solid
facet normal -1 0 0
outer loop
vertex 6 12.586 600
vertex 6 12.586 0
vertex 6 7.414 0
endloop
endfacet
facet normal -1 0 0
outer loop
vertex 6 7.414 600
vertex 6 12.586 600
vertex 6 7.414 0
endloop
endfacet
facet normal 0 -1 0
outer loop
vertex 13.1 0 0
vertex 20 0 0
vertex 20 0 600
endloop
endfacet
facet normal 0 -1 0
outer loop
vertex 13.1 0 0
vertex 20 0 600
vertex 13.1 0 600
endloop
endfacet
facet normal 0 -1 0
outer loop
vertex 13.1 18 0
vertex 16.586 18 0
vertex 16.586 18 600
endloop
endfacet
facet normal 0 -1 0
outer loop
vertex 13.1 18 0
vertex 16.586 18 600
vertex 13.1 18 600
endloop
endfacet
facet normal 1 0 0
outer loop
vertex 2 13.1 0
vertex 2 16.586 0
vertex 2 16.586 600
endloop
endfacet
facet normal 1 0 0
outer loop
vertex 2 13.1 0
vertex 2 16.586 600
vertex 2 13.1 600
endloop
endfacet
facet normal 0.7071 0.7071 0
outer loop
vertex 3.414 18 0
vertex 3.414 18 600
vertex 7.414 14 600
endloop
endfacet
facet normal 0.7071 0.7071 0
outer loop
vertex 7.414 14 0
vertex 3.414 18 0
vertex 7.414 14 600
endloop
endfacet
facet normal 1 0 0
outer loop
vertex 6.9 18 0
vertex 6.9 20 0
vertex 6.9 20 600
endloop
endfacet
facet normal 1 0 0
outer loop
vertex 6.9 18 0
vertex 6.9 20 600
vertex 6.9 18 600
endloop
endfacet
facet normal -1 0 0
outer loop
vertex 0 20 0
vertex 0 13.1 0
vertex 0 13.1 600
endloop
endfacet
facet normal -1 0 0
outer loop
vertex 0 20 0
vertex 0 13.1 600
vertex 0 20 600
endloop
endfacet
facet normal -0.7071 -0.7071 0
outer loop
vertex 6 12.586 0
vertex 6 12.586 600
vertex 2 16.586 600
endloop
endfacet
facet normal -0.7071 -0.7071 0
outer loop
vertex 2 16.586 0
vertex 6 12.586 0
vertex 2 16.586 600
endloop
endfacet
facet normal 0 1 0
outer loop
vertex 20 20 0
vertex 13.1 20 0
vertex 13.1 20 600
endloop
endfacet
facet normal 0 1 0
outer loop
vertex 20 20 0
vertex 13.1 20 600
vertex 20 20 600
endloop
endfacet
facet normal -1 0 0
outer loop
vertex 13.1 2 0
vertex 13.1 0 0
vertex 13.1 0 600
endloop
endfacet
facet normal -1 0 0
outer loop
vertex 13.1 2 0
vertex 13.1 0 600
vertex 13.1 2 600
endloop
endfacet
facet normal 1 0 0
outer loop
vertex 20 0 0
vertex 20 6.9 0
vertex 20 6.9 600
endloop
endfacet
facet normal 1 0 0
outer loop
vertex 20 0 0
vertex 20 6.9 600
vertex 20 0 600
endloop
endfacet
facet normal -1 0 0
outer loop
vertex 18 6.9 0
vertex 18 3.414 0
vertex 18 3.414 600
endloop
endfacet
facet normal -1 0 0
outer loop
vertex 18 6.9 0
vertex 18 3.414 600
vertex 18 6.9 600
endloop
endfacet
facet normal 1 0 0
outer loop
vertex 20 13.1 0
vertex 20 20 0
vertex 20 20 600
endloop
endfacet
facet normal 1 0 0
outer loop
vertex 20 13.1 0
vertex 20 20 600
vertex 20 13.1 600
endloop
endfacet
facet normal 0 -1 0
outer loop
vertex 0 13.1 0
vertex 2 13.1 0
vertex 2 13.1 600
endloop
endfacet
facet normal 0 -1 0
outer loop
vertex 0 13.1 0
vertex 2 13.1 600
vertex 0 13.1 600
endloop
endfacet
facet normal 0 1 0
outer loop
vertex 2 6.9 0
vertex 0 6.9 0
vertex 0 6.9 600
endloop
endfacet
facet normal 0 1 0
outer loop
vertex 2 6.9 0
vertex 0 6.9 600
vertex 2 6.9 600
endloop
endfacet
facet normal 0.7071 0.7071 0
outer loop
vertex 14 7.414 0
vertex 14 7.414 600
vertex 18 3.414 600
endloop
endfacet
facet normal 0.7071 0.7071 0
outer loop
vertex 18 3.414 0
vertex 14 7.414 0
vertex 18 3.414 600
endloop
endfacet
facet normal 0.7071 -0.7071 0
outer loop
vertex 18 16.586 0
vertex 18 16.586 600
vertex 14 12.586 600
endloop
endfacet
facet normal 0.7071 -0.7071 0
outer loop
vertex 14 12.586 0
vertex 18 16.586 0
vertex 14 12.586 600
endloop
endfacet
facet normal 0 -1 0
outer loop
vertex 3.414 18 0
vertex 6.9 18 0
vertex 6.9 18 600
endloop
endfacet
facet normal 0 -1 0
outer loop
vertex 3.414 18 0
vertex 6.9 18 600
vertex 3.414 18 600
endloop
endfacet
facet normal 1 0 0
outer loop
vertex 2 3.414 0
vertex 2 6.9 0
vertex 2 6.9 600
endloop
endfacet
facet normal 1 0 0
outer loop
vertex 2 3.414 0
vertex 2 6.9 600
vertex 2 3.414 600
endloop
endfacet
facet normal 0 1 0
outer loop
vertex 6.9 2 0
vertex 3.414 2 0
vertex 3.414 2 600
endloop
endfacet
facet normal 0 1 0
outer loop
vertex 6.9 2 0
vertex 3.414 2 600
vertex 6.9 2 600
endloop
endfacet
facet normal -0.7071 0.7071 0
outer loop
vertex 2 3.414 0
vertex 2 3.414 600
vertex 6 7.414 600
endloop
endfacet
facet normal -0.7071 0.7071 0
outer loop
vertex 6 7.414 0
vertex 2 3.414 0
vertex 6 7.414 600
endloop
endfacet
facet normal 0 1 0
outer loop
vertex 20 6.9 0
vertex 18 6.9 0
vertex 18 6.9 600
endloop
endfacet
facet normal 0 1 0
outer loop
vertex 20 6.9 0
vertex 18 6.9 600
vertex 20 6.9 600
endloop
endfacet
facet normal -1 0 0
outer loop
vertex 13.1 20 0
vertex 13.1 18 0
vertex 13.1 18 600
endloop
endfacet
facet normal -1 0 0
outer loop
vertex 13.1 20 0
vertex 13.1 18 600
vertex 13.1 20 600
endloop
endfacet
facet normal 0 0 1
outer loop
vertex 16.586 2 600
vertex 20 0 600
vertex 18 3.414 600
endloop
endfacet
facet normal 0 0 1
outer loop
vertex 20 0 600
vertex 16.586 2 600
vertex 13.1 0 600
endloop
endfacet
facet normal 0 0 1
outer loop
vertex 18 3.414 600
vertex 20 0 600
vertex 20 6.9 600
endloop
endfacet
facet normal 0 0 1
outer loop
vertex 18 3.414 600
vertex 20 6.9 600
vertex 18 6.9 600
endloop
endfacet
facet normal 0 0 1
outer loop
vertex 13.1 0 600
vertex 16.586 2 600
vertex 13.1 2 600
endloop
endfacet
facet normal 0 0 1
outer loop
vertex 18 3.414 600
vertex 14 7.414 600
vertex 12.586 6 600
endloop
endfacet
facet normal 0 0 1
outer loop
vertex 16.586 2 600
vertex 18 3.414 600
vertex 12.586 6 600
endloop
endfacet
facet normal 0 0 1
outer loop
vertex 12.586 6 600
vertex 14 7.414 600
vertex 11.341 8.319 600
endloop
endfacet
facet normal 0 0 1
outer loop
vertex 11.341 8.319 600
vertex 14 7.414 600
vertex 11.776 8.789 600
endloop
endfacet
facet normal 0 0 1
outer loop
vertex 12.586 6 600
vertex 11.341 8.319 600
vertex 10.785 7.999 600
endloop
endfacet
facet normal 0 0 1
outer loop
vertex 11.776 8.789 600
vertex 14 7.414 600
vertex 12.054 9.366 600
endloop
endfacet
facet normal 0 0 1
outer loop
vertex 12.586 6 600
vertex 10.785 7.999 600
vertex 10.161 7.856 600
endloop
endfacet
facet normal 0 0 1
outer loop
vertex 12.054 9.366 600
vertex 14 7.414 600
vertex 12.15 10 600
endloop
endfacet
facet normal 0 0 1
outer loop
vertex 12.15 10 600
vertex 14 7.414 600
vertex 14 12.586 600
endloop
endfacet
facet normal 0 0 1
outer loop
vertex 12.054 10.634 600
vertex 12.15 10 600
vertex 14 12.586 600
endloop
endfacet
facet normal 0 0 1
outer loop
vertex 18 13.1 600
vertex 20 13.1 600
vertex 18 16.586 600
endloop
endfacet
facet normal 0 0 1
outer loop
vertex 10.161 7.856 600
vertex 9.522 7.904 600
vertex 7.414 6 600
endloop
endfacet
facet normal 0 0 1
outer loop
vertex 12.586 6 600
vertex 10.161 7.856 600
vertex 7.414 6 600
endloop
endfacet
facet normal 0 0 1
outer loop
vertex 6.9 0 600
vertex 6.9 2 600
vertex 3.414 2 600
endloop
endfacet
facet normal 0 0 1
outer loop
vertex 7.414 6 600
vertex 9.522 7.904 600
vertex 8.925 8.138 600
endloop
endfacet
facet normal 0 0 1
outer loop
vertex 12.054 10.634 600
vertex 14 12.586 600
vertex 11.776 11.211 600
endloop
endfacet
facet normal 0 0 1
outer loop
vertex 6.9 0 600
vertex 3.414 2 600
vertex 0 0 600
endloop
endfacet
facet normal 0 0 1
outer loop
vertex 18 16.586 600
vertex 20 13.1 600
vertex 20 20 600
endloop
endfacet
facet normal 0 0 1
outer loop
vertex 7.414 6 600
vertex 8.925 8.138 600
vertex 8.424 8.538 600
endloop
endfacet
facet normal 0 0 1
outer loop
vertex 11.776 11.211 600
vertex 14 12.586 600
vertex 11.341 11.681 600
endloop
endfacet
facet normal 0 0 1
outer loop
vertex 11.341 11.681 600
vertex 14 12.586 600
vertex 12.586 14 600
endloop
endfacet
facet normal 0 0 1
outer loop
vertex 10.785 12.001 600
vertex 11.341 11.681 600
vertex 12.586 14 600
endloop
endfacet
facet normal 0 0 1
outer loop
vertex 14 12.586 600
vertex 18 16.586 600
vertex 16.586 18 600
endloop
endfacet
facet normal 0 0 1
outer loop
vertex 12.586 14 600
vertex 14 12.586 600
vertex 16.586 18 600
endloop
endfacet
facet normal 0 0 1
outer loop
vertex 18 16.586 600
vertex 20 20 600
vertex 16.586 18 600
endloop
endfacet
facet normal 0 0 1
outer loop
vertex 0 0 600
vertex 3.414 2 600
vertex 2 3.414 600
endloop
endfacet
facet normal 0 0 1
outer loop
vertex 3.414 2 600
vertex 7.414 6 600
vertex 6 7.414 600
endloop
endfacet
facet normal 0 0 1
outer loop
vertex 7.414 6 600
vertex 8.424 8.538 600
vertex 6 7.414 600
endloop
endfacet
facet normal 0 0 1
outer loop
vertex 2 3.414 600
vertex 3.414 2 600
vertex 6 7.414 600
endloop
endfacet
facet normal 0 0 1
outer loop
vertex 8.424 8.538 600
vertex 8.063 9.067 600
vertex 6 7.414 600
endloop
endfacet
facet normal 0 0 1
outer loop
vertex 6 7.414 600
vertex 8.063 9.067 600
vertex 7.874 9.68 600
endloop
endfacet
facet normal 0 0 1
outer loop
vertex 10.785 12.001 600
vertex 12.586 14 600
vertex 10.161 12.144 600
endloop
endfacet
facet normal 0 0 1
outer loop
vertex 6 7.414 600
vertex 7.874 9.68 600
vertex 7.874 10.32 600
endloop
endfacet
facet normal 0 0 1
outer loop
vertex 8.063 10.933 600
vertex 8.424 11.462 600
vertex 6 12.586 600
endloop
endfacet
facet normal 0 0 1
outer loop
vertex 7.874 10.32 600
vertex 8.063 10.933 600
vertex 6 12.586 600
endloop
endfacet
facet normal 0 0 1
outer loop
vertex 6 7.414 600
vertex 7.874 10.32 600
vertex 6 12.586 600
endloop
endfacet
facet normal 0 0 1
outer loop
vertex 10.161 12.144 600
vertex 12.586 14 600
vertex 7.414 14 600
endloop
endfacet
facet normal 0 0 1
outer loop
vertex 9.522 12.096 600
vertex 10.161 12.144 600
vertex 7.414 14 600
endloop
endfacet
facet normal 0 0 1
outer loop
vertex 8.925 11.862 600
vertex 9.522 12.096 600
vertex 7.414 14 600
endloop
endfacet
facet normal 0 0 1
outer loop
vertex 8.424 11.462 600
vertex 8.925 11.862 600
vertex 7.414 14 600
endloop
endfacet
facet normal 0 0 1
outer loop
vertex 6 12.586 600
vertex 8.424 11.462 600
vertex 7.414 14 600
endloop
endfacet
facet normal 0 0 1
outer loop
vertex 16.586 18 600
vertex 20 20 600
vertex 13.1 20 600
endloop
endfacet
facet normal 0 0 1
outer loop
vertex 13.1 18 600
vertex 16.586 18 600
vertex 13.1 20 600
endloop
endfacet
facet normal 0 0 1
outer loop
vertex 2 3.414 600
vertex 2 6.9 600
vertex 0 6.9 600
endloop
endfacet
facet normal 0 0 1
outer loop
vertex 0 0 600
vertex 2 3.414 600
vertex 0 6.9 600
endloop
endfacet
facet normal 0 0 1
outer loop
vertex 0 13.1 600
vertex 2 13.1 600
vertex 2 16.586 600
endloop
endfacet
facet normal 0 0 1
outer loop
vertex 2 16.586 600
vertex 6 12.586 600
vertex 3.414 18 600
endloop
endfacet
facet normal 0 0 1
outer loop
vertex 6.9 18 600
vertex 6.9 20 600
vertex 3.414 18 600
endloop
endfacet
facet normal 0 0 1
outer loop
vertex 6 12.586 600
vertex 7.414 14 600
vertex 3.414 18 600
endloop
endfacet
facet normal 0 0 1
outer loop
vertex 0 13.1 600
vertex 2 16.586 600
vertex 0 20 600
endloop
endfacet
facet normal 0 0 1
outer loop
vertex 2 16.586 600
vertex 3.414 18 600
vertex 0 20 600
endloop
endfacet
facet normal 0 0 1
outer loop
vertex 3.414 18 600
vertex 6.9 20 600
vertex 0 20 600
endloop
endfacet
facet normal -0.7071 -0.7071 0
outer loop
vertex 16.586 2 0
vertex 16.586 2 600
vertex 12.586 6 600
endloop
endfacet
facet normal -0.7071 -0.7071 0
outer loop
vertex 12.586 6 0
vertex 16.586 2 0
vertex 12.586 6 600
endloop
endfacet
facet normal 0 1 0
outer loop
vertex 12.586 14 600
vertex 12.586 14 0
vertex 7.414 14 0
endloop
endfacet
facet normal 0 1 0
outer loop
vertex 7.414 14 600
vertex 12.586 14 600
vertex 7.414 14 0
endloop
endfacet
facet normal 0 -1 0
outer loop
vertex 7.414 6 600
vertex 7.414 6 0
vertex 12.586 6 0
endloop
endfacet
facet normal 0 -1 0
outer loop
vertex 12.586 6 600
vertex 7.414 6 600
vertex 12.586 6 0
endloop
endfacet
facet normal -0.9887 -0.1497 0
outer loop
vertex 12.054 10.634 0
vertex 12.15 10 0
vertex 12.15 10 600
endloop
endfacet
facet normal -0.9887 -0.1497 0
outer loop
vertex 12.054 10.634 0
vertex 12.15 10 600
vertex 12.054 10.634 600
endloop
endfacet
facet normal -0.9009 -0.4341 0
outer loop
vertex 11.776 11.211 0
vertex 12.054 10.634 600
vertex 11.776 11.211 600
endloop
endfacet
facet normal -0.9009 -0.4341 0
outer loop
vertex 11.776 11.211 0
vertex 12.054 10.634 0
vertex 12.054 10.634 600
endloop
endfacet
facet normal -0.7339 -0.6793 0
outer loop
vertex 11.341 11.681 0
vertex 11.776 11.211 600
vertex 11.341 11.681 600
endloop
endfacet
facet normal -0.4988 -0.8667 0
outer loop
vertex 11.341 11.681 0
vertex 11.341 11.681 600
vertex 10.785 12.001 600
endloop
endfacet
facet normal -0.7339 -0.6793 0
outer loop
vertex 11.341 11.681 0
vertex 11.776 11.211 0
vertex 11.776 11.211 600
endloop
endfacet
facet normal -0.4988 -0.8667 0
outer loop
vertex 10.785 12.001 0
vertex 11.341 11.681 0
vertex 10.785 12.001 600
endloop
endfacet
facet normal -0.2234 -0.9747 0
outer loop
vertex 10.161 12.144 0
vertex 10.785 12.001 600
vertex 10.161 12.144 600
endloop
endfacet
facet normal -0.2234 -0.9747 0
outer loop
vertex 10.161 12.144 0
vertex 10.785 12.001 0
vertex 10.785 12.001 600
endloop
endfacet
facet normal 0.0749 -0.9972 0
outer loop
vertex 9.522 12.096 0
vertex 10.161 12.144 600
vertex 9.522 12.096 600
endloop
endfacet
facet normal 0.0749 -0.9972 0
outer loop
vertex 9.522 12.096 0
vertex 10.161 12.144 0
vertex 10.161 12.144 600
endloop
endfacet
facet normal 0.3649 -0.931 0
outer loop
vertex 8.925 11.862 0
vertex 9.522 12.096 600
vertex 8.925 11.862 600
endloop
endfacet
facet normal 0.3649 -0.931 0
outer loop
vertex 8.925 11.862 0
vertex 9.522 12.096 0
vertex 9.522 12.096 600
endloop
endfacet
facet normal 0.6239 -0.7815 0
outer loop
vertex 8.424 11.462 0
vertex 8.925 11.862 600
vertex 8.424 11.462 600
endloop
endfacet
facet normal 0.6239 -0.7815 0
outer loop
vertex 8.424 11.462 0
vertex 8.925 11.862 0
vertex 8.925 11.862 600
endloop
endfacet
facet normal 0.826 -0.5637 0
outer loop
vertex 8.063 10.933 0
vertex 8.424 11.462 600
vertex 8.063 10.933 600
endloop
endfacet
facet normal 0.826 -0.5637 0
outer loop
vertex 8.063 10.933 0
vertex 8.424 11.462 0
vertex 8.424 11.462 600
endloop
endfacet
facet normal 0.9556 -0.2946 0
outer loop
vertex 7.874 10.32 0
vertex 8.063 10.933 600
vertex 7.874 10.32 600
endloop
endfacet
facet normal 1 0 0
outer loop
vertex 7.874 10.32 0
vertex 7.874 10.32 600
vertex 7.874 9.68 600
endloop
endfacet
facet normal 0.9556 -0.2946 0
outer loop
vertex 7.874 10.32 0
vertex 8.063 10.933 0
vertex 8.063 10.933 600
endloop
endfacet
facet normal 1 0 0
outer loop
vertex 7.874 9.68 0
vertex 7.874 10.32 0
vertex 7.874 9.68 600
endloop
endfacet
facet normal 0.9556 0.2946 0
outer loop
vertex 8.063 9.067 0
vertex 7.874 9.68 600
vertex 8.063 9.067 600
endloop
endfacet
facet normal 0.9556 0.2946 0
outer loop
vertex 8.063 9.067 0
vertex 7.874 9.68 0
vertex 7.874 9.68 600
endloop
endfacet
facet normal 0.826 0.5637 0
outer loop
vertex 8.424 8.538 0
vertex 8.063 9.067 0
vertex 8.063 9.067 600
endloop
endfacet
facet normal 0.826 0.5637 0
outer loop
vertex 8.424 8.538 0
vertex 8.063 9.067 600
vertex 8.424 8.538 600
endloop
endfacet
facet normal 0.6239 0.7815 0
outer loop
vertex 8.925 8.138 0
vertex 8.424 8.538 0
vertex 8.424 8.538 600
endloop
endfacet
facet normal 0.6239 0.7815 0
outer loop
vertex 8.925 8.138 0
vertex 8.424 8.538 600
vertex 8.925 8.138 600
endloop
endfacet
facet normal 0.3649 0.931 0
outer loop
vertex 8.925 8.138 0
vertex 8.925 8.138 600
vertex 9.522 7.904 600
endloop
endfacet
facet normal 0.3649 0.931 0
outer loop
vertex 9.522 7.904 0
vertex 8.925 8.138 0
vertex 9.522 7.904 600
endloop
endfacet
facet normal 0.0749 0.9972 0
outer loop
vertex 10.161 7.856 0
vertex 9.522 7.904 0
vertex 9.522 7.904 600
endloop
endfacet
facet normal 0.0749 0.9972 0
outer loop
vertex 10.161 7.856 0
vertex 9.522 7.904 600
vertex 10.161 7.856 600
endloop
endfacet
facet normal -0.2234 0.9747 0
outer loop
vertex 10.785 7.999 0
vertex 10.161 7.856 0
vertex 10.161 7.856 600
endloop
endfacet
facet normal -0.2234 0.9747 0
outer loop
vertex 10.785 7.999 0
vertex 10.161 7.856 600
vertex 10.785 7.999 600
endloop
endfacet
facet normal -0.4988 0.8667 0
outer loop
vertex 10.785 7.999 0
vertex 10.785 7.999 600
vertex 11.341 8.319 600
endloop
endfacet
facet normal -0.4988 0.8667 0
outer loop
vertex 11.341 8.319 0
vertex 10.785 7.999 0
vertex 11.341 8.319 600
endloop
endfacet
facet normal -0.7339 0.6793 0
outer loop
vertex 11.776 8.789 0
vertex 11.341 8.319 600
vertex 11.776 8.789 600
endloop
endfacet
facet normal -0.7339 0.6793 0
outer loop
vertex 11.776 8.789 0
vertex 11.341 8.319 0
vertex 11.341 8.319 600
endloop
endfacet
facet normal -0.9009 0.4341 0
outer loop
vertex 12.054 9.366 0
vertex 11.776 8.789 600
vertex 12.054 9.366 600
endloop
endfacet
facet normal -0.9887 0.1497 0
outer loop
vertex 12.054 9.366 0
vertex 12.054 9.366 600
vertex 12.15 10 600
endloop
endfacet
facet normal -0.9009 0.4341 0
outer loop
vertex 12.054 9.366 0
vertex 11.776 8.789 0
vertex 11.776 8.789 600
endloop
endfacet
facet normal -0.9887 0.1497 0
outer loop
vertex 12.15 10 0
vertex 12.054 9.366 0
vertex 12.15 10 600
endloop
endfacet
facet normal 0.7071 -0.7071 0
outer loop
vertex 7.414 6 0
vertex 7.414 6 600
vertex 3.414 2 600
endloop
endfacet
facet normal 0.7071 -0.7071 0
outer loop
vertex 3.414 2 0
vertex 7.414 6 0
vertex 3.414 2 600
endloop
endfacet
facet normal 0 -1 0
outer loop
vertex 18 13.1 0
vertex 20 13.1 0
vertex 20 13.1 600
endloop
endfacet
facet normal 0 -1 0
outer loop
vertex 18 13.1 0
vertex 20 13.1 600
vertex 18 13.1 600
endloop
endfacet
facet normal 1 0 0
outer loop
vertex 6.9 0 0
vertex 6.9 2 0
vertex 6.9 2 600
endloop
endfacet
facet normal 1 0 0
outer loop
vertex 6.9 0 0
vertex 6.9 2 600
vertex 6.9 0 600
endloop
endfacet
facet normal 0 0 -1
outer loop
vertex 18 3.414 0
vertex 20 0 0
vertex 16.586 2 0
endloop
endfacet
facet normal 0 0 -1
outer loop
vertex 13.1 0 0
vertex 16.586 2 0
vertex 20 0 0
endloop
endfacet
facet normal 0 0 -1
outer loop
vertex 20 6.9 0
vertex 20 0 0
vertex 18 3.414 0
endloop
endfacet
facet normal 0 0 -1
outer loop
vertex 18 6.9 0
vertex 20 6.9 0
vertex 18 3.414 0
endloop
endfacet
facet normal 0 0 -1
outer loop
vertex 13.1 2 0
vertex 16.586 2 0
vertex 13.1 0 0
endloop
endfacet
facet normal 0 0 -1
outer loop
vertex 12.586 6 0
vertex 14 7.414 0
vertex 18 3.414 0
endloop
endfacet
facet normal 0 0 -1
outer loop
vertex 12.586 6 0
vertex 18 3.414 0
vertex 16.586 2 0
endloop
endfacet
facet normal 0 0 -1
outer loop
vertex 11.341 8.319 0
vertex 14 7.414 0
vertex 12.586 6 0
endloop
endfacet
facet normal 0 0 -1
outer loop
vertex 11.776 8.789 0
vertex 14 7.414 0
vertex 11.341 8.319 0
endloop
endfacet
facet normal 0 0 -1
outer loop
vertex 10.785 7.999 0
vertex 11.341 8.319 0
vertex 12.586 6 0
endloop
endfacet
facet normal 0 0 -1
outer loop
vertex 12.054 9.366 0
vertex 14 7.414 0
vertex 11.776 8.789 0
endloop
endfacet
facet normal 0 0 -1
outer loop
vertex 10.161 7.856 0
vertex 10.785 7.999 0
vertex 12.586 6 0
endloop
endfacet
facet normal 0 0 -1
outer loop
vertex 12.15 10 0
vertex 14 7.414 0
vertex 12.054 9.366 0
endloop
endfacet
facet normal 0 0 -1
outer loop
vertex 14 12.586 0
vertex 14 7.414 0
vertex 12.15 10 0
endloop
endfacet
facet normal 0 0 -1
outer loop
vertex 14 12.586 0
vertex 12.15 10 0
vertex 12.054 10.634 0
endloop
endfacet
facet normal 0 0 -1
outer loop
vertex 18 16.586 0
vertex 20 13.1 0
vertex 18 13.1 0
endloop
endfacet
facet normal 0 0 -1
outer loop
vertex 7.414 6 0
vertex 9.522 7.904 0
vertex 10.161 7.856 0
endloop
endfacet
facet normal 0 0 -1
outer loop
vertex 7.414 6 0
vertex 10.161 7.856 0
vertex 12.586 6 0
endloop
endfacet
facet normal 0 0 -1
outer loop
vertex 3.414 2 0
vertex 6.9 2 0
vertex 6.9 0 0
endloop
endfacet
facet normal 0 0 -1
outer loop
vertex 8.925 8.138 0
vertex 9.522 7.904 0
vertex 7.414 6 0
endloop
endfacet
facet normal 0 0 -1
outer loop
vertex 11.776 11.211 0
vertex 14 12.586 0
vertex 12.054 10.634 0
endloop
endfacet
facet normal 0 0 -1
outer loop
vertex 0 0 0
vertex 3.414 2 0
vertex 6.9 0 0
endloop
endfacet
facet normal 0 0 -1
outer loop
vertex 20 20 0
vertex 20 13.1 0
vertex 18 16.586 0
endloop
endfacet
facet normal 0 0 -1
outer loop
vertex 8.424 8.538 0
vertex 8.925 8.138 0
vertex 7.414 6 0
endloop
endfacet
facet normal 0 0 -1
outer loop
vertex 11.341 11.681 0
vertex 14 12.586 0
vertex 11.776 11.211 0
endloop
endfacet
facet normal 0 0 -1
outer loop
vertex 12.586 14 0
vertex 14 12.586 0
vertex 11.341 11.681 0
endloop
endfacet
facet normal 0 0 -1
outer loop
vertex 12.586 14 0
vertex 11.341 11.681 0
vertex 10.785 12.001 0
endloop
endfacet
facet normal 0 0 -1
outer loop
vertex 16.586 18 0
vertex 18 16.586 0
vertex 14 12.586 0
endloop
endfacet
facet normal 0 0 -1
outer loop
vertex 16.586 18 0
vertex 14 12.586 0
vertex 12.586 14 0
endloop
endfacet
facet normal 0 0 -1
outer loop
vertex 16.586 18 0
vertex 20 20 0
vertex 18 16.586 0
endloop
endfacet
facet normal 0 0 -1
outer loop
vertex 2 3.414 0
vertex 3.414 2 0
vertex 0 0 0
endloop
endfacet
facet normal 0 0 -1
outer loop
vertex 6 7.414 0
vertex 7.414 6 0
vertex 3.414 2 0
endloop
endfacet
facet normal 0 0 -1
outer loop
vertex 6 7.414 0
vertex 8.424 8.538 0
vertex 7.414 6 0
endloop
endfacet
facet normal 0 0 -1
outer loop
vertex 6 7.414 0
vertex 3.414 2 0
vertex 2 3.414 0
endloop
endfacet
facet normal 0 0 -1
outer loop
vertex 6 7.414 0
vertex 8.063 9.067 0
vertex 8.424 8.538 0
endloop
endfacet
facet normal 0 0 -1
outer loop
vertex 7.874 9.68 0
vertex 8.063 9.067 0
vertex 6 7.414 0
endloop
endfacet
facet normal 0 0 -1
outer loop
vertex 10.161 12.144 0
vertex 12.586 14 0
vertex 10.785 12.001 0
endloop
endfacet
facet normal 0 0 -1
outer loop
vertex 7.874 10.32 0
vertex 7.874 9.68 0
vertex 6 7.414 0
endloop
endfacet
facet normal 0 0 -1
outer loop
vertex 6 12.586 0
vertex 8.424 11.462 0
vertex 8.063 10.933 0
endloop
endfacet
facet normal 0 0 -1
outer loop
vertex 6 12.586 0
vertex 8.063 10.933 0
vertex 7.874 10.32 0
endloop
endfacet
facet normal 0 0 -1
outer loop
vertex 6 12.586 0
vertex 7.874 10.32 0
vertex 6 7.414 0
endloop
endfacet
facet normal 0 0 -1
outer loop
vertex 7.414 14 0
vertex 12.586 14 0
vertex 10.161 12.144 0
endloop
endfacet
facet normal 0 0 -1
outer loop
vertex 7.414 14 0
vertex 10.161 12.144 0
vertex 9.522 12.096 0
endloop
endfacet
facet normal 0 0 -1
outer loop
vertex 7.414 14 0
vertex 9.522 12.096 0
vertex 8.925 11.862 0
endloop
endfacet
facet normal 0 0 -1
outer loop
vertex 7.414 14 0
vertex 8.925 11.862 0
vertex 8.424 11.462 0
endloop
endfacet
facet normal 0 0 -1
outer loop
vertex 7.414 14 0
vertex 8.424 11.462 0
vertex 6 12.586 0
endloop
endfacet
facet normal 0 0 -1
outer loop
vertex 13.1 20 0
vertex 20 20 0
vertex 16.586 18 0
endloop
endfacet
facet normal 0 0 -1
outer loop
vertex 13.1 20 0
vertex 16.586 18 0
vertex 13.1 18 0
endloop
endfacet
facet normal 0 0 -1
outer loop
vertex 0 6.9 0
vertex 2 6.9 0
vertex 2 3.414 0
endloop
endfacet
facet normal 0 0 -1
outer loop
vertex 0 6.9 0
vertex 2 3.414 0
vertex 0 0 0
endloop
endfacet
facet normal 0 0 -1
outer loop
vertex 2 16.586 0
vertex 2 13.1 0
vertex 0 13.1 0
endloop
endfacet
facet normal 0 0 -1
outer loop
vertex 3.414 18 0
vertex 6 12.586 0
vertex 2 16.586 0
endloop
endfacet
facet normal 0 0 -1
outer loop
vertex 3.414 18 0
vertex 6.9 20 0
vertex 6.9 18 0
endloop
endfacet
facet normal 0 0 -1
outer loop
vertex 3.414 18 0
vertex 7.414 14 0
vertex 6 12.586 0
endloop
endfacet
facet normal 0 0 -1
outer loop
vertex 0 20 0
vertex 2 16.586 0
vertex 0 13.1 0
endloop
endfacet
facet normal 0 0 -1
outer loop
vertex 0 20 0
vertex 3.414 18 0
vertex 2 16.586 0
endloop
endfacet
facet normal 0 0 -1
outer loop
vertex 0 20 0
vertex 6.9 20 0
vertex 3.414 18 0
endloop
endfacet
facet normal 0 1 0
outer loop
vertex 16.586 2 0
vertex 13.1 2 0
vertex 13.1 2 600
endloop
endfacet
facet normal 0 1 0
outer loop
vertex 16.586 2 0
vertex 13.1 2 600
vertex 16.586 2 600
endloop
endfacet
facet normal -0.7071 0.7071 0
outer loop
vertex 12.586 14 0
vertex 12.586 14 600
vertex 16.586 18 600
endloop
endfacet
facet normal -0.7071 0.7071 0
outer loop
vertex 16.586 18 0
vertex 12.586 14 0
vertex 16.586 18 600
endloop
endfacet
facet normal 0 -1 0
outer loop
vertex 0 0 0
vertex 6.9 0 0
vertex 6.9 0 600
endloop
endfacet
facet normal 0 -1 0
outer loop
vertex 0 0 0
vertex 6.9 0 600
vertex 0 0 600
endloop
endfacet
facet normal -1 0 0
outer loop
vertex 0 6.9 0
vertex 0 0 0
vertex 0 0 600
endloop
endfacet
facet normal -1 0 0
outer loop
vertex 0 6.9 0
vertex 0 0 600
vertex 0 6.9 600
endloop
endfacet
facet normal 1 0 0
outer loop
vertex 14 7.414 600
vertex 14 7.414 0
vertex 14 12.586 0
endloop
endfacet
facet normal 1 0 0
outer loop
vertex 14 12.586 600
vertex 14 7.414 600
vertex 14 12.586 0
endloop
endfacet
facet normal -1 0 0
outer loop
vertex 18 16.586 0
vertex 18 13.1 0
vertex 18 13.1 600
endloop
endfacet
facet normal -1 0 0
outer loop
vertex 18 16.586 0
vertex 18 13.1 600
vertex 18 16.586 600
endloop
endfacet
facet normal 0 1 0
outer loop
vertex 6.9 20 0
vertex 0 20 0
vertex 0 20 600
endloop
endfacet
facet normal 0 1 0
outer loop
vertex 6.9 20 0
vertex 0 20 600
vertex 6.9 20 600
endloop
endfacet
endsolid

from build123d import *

# Parameters (mm, degrees)
ESQUISSE1_R        = 2.15
BOSS_EXTRU_1_DEPTH = 600


with BuildPart() as part:
    # Esquisse1 → Boss.-Extru.1 (new body)
    with BuildSketch(Plane.XY):
        Polygon((20, 13.1), (18, 13.1), (18, 16.585786438), (14, 12.585786438), (14, 10), (14, 7.414213562), (18, 3.414213562), (18, 6.9), (20, 6.9), (20, 0), (13.1, 0), (13.1, 2), (16.585786438, 2), (12.585786438, 6), (10, 6), (7.414213562, 6), (3.414213562, 2), (6.9, 2), (6.9, 0), (0, 0), (0, 6.9), (2, 6.9), (2, 3.414213562), (6, 7.414213562), (6, 10), (6, 12.585786438), (2, 16.585786438), (2, 13.1), (0, 13.1), (0, 20), (6.9, 20), (6.9, 18), (3.414213562, 18), (7.414213562, 14), (10, 14), (12.585786438, 14), (16.585786438, 18), (13.1, 18), (13.1, 20), (20, 20), align=None)
        with Locations((10, 10)):
            Circle(ESQUISSE1_R, mode=Mode.SUBTRACT)
    extrude(amount=BOSS_EXTRU_1_DEPTH)


solid = part.part
